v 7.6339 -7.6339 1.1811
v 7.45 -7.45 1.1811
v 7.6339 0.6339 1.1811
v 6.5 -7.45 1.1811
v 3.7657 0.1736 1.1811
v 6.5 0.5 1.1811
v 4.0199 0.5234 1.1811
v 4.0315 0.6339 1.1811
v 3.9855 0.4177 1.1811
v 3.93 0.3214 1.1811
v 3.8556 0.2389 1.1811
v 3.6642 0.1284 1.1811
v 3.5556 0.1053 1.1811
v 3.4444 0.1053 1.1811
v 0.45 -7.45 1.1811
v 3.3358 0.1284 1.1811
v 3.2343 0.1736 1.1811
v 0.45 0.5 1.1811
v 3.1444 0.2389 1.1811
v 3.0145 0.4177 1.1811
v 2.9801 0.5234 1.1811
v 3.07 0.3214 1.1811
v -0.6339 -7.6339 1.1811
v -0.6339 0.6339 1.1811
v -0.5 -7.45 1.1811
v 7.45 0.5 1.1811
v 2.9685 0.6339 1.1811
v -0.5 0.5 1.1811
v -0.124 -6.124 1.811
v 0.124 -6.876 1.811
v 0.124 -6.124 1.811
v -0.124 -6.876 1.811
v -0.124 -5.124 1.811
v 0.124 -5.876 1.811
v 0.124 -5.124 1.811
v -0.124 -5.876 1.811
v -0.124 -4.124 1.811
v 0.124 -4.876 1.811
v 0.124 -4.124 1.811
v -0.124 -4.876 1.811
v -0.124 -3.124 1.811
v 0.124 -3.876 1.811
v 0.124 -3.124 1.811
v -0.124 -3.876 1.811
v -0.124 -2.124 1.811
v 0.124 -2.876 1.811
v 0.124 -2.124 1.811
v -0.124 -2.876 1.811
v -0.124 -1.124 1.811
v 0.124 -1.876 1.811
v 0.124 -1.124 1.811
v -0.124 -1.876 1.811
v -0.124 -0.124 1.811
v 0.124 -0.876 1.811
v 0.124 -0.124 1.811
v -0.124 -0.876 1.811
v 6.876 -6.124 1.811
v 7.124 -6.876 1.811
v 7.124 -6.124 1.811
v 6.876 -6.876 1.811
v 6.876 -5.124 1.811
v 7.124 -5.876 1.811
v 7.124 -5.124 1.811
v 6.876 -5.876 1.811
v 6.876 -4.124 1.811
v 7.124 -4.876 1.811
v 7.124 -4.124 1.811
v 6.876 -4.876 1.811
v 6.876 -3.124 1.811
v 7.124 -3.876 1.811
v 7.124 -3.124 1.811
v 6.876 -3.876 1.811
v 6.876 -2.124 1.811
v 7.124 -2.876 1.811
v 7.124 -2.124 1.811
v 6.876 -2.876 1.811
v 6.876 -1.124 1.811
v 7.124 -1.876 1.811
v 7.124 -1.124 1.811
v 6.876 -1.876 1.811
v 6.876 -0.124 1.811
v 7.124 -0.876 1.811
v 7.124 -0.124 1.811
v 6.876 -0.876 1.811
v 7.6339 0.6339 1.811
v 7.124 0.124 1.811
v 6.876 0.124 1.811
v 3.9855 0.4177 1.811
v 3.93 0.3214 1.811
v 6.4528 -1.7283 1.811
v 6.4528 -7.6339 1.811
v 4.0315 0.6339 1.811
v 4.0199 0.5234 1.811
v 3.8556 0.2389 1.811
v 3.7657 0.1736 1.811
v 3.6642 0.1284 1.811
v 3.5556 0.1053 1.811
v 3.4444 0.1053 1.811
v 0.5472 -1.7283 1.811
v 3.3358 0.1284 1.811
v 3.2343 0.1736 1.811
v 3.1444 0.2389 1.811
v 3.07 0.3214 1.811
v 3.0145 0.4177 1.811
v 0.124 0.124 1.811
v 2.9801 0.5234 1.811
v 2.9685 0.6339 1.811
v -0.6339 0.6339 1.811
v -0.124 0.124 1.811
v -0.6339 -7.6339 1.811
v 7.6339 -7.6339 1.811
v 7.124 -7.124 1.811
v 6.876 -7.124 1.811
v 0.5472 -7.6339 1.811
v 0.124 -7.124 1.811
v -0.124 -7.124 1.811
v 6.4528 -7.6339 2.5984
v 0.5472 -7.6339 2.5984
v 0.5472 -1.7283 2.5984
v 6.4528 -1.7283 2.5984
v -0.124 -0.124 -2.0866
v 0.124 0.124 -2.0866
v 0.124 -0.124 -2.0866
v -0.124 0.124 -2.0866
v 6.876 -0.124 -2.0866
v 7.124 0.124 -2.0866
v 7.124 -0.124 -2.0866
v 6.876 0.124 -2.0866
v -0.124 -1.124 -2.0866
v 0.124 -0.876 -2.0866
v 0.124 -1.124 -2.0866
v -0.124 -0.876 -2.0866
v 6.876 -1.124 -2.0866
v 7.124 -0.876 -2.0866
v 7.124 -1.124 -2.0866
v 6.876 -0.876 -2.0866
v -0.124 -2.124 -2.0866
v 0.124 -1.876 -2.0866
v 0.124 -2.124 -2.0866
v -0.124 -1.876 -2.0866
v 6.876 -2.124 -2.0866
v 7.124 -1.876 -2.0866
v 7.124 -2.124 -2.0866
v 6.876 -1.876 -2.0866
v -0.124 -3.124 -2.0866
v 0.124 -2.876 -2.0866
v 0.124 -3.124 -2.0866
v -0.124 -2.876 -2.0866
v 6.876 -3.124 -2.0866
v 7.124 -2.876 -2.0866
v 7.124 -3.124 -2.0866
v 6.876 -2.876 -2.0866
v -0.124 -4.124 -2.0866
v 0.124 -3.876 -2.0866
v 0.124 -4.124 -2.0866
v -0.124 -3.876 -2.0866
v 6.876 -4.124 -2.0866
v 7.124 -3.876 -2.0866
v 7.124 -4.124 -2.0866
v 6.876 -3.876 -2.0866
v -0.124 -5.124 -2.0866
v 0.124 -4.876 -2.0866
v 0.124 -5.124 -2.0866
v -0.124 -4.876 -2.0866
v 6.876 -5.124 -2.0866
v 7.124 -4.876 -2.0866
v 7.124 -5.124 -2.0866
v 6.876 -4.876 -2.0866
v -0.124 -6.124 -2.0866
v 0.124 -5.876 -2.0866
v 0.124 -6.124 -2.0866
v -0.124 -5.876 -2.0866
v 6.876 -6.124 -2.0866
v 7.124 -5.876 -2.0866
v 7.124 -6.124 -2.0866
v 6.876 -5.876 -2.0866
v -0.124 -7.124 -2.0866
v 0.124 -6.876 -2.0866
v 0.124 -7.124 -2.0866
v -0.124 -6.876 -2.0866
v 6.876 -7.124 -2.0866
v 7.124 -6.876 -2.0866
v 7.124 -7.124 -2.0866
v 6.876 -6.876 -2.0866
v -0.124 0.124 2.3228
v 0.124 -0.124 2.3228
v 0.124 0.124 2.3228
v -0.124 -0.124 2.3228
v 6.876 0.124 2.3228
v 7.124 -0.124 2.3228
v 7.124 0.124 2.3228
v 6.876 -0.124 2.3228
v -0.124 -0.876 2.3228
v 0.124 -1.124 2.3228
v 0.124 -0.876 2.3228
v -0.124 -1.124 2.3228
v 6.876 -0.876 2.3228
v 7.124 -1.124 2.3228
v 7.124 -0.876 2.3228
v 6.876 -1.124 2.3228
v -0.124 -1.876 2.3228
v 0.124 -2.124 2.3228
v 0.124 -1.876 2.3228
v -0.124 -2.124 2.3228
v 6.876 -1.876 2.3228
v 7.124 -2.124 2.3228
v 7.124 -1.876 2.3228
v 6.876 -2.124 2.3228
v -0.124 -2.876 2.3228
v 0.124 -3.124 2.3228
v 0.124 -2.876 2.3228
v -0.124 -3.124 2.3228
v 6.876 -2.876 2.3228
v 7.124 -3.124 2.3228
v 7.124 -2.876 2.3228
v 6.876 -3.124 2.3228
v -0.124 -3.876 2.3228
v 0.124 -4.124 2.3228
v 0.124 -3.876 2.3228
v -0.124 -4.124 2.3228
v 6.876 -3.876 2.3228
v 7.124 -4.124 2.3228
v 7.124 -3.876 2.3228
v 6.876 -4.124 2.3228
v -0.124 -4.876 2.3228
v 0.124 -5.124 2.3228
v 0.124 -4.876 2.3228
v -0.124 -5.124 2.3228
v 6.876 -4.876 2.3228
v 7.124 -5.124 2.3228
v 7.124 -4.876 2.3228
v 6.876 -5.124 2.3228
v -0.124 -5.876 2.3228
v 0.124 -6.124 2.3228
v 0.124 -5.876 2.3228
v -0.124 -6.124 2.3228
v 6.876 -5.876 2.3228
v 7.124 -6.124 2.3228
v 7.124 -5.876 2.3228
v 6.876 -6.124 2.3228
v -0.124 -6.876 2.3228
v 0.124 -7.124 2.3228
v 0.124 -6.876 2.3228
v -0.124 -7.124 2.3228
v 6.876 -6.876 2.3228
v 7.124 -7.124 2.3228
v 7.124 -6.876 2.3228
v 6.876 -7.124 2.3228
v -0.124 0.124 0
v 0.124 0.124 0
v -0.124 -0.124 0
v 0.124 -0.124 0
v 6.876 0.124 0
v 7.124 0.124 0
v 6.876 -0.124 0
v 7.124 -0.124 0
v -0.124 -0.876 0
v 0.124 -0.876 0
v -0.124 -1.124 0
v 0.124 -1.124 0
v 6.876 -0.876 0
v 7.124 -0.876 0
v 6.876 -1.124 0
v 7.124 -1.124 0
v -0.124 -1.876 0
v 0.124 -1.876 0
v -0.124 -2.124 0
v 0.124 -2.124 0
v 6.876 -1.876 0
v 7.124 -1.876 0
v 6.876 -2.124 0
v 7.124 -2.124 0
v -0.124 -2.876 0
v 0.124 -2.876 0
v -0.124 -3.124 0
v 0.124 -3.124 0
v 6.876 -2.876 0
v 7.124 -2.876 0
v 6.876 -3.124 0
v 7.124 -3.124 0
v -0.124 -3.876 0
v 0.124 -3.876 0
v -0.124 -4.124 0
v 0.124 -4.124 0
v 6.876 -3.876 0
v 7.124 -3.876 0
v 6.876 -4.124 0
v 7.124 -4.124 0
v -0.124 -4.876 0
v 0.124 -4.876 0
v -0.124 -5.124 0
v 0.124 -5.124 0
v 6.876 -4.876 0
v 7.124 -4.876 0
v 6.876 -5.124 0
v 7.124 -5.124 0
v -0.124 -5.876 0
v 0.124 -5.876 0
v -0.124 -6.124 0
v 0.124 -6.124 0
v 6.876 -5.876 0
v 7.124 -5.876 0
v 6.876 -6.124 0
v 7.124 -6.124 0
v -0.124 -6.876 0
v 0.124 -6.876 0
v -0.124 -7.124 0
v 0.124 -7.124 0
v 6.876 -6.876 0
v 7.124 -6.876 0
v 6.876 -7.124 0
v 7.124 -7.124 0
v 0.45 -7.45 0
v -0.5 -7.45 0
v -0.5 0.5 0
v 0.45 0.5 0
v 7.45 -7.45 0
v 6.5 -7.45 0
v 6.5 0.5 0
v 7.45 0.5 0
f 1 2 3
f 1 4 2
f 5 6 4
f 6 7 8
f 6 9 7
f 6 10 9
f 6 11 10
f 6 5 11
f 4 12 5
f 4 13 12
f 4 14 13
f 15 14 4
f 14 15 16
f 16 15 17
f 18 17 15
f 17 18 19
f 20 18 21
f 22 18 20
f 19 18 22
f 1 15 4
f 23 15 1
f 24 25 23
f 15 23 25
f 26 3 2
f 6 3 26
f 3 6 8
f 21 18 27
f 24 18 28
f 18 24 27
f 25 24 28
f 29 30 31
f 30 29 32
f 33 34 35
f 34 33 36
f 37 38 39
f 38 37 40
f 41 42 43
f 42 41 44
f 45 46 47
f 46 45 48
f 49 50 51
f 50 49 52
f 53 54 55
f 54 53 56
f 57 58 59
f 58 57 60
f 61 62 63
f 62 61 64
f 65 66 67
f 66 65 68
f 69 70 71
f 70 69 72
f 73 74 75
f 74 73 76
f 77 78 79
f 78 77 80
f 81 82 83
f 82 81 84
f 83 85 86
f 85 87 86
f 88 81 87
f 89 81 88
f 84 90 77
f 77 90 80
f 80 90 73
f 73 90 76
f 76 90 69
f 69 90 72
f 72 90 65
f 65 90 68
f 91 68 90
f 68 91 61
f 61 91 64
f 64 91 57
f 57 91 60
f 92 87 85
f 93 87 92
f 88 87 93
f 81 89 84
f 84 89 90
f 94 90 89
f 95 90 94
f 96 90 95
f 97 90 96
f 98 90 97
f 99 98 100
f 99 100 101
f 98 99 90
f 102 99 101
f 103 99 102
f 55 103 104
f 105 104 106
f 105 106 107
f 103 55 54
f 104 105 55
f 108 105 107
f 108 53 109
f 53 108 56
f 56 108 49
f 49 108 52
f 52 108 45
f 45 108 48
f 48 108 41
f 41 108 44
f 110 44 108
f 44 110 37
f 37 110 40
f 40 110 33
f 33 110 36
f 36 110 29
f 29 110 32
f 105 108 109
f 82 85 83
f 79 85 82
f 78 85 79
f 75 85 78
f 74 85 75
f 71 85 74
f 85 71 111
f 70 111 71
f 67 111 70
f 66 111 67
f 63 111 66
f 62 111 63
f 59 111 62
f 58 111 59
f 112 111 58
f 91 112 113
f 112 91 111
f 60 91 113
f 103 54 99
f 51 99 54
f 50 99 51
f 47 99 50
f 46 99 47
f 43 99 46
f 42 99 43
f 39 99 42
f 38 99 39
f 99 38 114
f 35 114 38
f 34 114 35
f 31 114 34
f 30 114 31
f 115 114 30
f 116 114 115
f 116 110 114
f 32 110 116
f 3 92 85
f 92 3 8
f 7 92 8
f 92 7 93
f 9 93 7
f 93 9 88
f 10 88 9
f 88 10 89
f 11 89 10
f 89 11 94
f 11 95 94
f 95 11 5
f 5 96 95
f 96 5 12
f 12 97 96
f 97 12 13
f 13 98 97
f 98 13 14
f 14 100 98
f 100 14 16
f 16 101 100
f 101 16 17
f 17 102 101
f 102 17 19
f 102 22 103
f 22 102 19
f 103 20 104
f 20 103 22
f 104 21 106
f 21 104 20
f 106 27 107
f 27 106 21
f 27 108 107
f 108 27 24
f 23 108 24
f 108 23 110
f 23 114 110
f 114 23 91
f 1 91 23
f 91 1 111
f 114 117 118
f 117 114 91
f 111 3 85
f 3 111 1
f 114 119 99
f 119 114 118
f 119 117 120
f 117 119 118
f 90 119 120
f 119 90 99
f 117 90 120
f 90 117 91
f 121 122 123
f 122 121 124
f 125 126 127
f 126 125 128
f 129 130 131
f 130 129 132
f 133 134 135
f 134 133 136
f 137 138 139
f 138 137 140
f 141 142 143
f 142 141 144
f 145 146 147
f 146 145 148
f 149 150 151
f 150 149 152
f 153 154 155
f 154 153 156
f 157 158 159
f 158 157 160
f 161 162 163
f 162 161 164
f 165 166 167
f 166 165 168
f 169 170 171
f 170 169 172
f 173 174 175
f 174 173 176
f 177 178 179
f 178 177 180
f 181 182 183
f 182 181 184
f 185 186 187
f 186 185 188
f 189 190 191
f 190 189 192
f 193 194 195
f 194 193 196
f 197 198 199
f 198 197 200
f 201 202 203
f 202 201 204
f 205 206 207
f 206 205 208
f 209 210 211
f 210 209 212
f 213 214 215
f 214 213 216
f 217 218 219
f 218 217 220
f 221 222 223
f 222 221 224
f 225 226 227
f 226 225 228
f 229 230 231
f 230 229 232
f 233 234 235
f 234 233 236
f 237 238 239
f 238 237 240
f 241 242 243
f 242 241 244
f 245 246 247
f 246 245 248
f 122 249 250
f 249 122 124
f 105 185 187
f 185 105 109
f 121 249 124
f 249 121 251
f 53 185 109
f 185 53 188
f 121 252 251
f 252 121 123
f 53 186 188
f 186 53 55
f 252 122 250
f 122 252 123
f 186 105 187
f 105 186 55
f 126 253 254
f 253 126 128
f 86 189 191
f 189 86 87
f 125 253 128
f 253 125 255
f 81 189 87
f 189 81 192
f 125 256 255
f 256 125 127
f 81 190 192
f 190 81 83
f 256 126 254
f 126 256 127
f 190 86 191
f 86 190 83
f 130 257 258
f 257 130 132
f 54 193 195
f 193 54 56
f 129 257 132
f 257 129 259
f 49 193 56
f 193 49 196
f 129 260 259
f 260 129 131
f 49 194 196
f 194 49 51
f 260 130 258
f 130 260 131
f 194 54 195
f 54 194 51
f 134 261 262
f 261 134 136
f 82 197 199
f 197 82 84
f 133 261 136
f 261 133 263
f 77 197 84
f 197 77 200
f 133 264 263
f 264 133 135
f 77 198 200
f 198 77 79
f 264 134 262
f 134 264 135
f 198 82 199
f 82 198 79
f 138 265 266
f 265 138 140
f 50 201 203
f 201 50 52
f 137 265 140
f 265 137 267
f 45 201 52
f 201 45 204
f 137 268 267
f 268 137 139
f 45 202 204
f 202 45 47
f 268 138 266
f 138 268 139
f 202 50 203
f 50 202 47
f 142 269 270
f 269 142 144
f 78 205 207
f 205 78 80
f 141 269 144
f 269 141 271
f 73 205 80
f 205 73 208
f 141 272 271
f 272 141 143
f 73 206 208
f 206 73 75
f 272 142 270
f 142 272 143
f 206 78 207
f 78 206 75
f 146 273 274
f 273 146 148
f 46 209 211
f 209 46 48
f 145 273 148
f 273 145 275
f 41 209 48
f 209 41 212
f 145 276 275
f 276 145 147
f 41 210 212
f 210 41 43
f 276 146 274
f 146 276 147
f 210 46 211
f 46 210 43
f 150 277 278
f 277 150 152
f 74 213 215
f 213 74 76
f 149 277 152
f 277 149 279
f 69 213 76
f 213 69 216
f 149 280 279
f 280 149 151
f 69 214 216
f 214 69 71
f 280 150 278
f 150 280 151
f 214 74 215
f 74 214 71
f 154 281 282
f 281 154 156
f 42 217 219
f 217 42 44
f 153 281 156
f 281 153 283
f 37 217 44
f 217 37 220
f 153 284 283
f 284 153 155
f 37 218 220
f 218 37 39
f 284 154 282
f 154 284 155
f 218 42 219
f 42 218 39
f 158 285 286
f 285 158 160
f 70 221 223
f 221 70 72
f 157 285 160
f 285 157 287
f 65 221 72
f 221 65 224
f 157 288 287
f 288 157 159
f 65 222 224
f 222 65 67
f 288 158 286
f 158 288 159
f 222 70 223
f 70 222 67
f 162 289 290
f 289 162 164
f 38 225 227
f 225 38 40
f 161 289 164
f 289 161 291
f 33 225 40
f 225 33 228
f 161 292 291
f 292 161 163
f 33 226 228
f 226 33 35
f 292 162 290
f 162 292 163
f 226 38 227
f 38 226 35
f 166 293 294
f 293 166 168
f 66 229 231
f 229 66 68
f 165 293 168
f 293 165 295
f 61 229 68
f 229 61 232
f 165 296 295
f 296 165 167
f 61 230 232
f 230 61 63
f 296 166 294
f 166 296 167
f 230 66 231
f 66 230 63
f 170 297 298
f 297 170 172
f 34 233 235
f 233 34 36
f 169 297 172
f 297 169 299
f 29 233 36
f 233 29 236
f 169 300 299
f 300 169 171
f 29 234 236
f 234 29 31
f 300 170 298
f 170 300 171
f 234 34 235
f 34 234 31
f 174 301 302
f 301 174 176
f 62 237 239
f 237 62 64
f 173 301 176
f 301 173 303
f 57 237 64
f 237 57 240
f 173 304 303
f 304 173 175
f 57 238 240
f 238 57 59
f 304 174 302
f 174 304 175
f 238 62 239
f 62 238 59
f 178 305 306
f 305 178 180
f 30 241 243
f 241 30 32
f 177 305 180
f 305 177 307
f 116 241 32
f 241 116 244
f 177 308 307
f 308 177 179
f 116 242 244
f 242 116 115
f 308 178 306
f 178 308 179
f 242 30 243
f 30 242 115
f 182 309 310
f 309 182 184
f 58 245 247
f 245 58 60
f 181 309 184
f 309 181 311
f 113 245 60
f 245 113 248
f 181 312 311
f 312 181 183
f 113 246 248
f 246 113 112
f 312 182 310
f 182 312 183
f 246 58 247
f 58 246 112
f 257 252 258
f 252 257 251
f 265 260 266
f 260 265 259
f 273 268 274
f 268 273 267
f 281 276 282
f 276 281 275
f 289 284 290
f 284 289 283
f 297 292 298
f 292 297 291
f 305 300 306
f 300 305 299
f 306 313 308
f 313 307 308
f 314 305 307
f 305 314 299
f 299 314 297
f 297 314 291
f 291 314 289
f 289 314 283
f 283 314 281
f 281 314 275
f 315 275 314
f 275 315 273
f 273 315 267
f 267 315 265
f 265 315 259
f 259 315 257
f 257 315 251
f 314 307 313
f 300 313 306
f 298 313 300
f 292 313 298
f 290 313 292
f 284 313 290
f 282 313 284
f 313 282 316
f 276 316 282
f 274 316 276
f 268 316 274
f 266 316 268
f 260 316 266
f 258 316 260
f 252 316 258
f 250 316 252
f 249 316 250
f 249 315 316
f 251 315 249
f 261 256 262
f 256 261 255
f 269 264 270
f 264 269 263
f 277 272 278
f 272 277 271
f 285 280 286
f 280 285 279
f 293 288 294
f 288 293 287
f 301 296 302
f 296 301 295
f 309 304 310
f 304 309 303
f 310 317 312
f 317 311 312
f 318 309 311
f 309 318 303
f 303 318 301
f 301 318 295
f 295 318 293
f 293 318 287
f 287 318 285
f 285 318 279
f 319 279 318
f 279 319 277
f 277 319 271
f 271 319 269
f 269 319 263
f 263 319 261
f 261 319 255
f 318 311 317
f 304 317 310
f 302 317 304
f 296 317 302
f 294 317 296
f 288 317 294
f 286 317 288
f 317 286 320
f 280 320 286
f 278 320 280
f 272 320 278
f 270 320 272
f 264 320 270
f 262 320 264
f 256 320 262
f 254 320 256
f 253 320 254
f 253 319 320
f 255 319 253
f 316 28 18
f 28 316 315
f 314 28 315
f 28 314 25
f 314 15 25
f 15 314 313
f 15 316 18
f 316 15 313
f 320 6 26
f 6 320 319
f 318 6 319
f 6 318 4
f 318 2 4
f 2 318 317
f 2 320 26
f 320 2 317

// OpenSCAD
// Model of a DFPlayer Mini
// Use Wings3D to convert the STL to .wrl (VRML) to make it
// usable in KiCad's 3D PCB viewer

function inch(x) = x*25.4;

module DFPlayerMini() {
    board_w = 21;
    board_l = 21;
    board_th = 1.6;
    
    pin_ascent  = 2.9;
    pin_descent = 8.3;  // depth below pin support
    pin_height = pin_ascent + pin_descent;
    pin_size    = 0.63;  // square pins
    pin_spacing = inch(0.1);
    pin_separation = inch(0.7);
    pin_count   = 16;  // 8 on each side, like a DIP

    support_h = 3.0;
    support_w = pin_spacing*0.95;
    support_l = (pin_count/2 - 0.05) * pin_spacing;
    
    card_slot_w = 15;
    card_slot_l = 15;
    card_slot_h = 2.0;    

    // In the x-y plane, the reference point will be the center of pin 1.
    // Along the z-axis, the reference is the bottom of the pin supports.
    pin_x1 = -pin_separation/2;
    pin_y1 = (pin_count / 2 - 1) * pin_spacing / 2;

    translate([-pin_x1, -pin_y1, support_h]) {
        color("green")
        linear_extrude(board_th) {
            difference() {
                square([board_w, board_l], center=true);
                translate([0, board_l/2]) circle(d=2.7, $fs=0.2);
            }
        }
        color("silver")
        translate([0, -(board_l - card_slot_l)/2, board_th]) {
            linear_extrude(card_slot_h) {
                square([card_slot_w, card_slot_l], center=true);
            }
        }
    }

    color("yellow")
    translate([0, 0, -pin_descent + support_h]) {
        linear_extrude(pin_height) {
            assert(pin_count % 2 == 0);
            for (i = [0:pin_count/2-1]) {
                translate([0, -i * pin_spacing]) {
                    square(pin_size, center=true);
                    translate([pin_separation, 0])
                        square(pin_size, center=true);
                }
            }
        }
    }
    
    color("black")
    translate([-pin_spacing/2, pin_spacing/2 - support_l]) {
        linear_extrude(support_h) {
            square([support_w, support_l]);
            translate([pin_separation, 0]) square([support_w, support_l]);
        }
    }
}

// We're going to use Wings3D to convert the STL to VRML.
// Wing3D uses units of 0.1 inch, and this OpenSCAD model uses 1 mm.
scale(1 / 2.54) {
    DFPlayerMini();
}
